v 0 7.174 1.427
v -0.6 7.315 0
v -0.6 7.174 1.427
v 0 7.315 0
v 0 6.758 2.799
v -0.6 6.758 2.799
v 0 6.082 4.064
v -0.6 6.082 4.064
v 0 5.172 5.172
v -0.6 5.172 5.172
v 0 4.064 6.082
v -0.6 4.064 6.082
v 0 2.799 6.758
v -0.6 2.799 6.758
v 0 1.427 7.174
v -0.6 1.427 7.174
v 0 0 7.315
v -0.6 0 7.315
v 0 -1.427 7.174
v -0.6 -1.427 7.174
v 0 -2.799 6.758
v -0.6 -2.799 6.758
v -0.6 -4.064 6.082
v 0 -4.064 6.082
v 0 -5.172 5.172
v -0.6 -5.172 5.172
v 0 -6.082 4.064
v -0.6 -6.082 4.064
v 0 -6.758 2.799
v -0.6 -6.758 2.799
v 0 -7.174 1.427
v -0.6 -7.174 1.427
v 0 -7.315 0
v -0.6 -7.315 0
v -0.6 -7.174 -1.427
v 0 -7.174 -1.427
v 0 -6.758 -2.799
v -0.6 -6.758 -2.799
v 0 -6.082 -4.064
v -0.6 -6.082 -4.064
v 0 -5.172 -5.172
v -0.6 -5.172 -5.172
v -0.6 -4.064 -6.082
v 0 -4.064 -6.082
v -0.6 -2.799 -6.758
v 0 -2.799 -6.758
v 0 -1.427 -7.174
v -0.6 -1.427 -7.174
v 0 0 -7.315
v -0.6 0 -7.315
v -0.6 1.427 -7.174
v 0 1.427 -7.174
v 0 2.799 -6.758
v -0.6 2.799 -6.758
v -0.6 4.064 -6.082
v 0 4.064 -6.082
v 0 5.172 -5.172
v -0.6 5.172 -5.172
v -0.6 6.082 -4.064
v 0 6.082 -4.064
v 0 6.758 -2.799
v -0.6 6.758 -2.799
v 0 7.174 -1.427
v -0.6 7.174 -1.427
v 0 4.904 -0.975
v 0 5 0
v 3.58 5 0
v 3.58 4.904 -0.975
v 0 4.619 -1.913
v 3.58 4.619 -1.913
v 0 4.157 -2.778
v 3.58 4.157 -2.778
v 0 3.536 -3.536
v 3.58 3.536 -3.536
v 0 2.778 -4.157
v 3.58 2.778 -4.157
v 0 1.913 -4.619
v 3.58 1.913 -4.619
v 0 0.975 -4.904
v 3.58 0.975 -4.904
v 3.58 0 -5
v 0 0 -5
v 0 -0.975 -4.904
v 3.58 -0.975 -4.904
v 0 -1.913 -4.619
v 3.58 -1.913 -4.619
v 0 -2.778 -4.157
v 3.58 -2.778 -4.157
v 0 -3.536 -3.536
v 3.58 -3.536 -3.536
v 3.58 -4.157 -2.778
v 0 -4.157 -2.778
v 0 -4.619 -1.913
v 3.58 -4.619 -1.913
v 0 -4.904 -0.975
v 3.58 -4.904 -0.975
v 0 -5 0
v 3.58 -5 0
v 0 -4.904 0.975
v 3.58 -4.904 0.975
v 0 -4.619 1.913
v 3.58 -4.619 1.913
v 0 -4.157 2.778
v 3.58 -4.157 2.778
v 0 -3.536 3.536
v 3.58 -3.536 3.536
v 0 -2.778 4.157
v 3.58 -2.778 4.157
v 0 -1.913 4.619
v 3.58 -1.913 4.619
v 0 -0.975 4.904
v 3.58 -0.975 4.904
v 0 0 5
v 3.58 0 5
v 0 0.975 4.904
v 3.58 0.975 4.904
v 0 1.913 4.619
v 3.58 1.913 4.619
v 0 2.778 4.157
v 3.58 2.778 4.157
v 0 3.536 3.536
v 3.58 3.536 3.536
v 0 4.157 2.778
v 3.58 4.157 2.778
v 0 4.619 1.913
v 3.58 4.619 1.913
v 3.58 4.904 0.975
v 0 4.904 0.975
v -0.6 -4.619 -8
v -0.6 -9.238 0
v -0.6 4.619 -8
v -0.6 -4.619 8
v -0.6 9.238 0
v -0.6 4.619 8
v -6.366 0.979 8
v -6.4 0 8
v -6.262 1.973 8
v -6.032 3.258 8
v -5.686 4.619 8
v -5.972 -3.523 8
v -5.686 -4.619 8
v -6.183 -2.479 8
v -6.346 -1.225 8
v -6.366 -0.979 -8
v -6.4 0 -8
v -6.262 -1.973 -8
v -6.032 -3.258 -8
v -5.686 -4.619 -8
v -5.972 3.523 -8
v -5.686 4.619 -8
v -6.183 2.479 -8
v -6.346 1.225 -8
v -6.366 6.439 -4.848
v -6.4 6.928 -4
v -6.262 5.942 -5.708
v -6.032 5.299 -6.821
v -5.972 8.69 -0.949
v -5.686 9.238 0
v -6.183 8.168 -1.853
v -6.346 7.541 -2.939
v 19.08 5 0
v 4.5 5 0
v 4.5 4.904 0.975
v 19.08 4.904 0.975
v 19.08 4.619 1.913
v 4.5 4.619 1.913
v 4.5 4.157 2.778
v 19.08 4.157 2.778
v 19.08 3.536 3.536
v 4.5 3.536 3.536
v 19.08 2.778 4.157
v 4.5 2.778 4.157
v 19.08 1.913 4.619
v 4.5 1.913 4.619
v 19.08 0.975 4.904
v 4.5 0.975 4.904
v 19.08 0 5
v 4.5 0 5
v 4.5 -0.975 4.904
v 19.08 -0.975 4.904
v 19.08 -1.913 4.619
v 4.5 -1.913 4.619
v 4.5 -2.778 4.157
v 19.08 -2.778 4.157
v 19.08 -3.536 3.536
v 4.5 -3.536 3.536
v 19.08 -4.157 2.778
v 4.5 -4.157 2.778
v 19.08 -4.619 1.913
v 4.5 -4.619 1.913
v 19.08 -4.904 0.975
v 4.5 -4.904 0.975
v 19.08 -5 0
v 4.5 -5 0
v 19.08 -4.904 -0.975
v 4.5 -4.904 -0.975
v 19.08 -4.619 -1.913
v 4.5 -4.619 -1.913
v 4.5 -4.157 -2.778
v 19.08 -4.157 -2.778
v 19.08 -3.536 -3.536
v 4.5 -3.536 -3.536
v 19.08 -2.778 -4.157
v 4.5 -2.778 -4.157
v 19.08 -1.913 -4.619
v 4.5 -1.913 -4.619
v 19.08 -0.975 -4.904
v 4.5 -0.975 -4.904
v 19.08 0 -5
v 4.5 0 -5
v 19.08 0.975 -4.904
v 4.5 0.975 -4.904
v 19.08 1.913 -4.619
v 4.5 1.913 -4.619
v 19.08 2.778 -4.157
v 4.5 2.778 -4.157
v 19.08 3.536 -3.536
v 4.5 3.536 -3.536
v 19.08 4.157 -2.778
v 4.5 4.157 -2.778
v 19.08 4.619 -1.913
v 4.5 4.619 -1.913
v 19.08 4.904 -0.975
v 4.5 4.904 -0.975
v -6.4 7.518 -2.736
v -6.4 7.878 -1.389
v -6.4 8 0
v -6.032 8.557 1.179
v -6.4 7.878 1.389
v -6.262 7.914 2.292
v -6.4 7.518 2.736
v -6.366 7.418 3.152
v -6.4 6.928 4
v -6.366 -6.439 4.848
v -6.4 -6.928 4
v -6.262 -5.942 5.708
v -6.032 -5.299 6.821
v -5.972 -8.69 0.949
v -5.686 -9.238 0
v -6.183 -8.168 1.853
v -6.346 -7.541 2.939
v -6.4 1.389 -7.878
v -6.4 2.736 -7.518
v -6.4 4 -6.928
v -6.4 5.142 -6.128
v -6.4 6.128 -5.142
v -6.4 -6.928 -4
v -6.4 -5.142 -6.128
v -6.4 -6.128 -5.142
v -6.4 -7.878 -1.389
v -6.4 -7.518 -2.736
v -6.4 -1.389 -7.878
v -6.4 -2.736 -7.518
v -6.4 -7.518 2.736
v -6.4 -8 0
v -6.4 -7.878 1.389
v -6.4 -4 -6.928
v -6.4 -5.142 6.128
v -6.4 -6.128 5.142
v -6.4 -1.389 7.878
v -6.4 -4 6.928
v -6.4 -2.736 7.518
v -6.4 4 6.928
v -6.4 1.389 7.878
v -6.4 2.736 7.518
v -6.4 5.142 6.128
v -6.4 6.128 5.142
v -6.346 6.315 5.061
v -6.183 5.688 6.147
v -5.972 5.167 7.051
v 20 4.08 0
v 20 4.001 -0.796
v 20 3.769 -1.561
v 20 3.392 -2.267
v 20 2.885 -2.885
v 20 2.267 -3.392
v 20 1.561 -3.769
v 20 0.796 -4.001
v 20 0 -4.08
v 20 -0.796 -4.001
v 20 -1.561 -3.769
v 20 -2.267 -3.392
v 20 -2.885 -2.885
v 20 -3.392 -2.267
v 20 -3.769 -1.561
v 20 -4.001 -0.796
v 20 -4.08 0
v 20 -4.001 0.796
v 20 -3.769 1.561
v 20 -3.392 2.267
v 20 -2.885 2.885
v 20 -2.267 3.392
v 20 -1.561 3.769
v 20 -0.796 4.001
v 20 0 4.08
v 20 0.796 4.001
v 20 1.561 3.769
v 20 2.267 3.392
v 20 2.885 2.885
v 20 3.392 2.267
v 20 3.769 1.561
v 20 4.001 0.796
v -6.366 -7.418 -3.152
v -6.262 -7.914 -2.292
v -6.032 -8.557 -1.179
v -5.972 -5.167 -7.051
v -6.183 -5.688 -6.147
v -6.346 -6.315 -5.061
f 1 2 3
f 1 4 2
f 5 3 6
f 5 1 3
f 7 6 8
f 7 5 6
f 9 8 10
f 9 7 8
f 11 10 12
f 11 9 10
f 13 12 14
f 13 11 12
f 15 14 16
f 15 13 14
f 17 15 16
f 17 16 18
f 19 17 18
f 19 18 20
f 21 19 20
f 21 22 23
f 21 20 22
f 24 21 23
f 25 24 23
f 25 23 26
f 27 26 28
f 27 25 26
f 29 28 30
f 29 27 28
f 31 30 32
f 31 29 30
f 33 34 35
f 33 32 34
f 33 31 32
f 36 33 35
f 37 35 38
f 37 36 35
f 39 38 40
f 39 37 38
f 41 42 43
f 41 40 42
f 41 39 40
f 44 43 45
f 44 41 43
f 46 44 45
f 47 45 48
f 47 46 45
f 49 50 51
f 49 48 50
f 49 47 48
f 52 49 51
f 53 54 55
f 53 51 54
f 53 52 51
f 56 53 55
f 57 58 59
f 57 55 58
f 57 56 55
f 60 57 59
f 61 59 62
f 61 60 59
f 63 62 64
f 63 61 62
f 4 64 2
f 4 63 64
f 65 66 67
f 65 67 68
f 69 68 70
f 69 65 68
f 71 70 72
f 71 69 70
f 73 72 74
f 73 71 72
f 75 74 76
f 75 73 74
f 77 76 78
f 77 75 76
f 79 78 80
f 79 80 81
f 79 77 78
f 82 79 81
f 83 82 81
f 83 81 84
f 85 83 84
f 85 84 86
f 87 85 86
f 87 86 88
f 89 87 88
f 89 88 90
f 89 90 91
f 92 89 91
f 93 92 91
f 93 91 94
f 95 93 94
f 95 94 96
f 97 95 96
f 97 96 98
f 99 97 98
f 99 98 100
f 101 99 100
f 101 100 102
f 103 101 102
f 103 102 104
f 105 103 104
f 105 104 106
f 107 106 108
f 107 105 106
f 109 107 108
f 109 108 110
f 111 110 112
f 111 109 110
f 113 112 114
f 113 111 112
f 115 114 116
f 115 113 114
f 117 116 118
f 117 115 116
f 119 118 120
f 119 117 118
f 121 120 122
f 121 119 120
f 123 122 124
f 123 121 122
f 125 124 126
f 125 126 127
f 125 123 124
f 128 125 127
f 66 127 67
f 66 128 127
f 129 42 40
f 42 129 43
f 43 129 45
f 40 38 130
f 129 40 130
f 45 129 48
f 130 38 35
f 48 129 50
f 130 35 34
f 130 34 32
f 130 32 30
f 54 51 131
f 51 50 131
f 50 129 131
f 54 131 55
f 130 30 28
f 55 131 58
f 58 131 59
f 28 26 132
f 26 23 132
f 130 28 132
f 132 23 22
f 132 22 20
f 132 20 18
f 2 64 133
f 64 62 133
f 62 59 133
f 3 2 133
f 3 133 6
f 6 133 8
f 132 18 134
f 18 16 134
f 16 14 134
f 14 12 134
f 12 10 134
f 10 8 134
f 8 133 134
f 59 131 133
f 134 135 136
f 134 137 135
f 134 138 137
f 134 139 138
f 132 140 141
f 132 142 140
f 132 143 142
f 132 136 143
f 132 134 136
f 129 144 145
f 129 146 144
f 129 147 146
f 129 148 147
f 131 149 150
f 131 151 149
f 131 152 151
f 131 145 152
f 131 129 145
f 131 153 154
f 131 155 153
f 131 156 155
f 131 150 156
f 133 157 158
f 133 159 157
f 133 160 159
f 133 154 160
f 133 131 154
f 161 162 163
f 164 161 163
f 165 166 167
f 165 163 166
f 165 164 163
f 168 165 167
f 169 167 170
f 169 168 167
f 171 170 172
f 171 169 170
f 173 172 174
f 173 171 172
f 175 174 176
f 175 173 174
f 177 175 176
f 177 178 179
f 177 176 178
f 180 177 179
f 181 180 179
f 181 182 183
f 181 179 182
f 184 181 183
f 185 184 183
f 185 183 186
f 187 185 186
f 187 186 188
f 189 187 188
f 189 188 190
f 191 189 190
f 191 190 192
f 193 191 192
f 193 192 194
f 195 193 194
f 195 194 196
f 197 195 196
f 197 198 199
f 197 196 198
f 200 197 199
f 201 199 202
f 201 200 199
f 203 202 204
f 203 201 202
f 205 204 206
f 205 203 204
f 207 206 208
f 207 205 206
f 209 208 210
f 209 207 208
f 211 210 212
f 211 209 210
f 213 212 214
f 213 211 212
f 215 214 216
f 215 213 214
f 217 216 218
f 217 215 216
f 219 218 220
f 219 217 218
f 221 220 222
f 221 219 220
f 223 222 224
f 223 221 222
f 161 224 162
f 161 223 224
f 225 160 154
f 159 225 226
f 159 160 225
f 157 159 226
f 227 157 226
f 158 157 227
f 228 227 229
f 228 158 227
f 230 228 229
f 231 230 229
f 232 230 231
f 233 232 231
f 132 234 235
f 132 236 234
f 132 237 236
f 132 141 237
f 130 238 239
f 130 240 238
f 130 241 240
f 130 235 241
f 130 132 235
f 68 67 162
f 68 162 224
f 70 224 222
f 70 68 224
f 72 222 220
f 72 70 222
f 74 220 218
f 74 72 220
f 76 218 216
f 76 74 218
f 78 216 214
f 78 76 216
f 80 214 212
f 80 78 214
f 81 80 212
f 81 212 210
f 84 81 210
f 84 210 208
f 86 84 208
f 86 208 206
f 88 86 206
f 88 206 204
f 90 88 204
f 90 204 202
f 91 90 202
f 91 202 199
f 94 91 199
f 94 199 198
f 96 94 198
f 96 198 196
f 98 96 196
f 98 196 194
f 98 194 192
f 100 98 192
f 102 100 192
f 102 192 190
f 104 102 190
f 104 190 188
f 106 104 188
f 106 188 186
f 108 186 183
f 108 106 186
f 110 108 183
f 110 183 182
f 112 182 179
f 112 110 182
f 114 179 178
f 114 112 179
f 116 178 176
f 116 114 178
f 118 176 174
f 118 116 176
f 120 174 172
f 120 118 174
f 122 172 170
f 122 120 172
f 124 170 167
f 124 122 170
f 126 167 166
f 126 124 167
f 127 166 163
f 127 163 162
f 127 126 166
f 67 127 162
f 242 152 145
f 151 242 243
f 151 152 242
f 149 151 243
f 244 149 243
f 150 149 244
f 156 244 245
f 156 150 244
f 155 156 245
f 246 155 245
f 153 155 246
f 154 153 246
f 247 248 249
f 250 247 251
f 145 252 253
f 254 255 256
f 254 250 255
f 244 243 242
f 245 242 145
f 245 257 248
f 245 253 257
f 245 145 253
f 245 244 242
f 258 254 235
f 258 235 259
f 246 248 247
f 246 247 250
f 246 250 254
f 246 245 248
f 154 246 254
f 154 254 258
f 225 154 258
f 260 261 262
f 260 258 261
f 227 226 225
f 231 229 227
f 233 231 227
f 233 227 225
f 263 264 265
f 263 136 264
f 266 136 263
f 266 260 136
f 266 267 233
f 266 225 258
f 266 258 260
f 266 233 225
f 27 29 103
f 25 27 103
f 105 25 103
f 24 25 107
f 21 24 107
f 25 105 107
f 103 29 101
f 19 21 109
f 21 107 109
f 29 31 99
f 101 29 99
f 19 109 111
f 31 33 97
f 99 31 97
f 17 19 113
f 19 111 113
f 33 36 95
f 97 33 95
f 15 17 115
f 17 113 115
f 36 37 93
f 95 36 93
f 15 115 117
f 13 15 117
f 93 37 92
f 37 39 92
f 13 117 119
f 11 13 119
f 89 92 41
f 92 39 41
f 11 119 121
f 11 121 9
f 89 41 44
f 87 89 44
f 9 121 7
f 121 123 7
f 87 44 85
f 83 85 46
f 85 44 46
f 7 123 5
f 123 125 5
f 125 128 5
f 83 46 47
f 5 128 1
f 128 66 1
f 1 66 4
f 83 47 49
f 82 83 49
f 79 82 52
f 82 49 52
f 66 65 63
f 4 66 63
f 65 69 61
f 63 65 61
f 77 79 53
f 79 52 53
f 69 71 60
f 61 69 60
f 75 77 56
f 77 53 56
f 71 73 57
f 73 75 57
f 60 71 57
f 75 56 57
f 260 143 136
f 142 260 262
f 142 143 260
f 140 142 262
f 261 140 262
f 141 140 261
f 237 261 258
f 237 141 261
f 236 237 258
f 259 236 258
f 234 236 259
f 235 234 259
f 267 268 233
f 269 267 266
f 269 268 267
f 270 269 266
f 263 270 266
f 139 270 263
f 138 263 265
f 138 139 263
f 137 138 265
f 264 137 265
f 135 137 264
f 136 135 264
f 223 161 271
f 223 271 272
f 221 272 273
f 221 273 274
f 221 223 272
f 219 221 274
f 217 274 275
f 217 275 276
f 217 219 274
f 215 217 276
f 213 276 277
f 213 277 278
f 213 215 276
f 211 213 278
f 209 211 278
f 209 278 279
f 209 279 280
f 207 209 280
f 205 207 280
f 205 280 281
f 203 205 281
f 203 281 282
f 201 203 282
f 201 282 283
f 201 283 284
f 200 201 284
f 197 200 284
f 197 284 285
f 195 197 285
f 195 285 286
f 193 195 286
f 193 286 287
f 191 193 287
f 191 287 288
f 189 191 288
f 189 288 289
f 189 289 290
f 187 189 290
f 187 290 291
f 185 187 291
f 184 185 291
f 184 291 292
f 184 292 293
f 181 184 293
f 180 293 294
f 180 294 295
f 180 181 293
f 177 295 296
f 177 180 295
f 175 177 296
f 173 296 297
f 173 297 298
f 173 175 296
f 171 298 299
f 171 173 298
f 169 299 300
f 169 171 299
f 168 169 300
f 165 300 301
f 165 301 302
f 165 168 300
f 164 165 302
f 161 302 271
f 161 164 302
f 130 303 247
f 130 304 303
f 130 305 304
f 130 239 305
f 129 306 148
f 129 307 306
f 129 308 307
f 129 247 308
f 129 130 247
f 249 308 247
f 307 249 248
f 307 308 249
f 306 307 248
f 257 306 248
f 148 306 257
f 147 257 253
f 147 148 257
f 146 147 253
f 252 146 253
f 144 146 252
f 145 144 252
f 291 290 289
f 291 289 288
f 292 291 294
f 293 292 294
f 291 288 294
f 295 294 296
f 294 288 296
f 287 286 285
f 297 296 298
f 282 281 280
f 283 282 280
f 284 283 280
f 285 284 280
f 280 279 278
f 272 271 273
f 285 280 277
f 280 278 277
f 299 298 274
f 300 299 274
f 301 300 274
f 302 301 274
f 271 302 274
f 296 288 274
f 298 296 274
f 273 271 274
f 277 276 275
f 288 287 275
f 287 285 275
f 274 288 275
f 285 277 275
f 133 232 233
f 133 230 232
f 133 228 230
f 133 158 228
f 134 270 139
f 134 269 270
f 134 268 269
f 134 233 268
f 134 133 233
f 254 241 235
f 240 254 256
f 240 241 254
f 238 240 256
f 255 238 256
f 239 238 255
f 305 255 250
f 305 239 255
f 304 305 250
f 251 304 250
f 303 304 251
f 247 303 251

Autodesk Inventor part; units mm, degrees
ref_plane "YZ Plane" through (0, 0, 0) normal (1, 0, 0) x (0, 1, 0)
ref_plane "XZ Plane" through (0, 0, 0) normal (0, 1, 0) x (-1, 0, 0)
sketch "Sketch1" plane through (0, 0, 0) normal (0, 0, 1) x (1, 0, 0)
  line L0 (0, 7.315) -> (0, 5)
  line L1 (4.5, 5) -> (20, 5)
  line L2 (20, 5) -> (20, 0)
  line L3 (20, 0) -> (-0.6001, 0)
  line L4 (-4.7201, 0) -> (24.12, 0) projected
  line L5 (-0.6001, 0) -> (-0.6001, 7.315)
  line L6 (-0.6001, 7.315) -> (0, 7.315)
  line L7 (4.5, 5) -> (3.5797, 5)
  line L8 (3.5797, 5) -> (0, 5)
  line L9 (0, -1.463) -> (0, 8.778) projected
  dimension "d0" = 20
  dimension "d1" = 15.5
  dimension "d2" = 10
  dimension "d9" = 0.6001
  dimension "d10" = 14.63
  dimension "d13" = 0.9203
  dimension "d14" = 10
revolve "Body" add sketch "Sketch1" angle 360 about axis through (20, 0, 0) along (-1, 0, 0)
sketch "Sketch2" plane through (-0.6001, 0, 0) normal (-1, 0, 0) x (0, 0, 1)
  line L0 (0, 9.2376) -> (8, 4.6188)
  line L1 (8, 4.6188) -> (8, -4.6188)
  line L2 (8, -4.6188) -> (0, -9.2376)
  line L3 (0, -9.2376) -> (-8, -4.6188)
  line L4 (-8, -4.6188) -> (-8, 4.6188)
  line L5 (-8, 4.6188) -> (0, 9.2376)
  point P0 (0, 0)
  point P1 (0, 0)
  dimension "d11" = 16
extrude "Head" add sketch "Sketch2" along normal blind 5.8
sketch "Sketch4" plane through (0, 0, 0) normal (0, 0, 1) x (1, 0, 0)
  line L0 (-6.4001, 8) -> (-6.4001, 9.2376)
  line L1 (-6.4001, 9.2376) -> (-5.6856, 9.2376)
  line L2 (-5.6856, 9.2376) -> (-6.4001, 8)
  line L3 (-7.5601, 0) -> (0.5599, 0) projected
  line L4 (-0.6001, 9.2376) -> (-6.4001, 9.2376) projected
  line L5 (-6.4001, 4.6188) -> (-6.4001, 9.2376) projected
  dimension "d5" = 30
  dimension "d19" = 16
revolve "Chamfer1" cut sketch "Sketch4" angle 360 about axis through (-10, 0, 0) along (1, 0, 0)
thread "Thread" size "M10x1.5" class "6g" standard "ISO Metric profile" length 15.5
chamfer "Chamfer2" distance 0.9202 distance2 0.9203 1 edges at (20, -5, 0) measured on face at (20, -0.8193, 0.3214)
ref_plane "Work Plane1" through (1.525, 0, 0) normal (0, 0, 1) x (1, 0, 0)
equation "\"d0\" = NLG"
equation "\"d1\" = GEL"
equation "\"d2\" = GD"
equation "\"d10\" = SD2"
equation "\"d14\" = BDM"
equation "\"d11\" = SW"
equation "\"d3\" = KOH - SD"
equation "\"d5\" = ANG1"
equation "\"d19\" = SW0"
equation "\"d15\" = GEL"
equation "\"d6\" = -0.5 * SPD + 0.5 * GD"
equation "\"NLG\" = 20"
equation "\"GD\" = NND"
equation "\"BDM\" = NND"
equation "\"KOH\" = 6.4"
equation "\"GEL\" = 15.5"
equation "\"SW\" = 16"
equation "\"SW0\" = SW"
equation "\"SPD\" = NND - 1.2269 * PTC"
equation "\"SD2\" = 14.63"
equation "\"SD\" = 0.6"
equation "\"ANG1\" = 30deg"
equation "\"GAL\" = 0.61345 * PTC"
equation "\"GUL\" = 0.61345 * PTC"
equation "\"RR\" = 0.4"
equation "\"GD1\" = THREADDIA - 1.2269 * PTC"
equation "\"SDH\" = SD2"
equation "\"SDHG\" = 4.5"
equation "\"TOA\" = 30deg"
equation "\"PTC\" = 1.5"
equation "\"E0\" = 18.48"
equation "\"NND\" = 10"
equation "\"THREADDIA\" = 10"
properties part number "ISO 4017 - M10 x 20" material "Steel, Mild"
